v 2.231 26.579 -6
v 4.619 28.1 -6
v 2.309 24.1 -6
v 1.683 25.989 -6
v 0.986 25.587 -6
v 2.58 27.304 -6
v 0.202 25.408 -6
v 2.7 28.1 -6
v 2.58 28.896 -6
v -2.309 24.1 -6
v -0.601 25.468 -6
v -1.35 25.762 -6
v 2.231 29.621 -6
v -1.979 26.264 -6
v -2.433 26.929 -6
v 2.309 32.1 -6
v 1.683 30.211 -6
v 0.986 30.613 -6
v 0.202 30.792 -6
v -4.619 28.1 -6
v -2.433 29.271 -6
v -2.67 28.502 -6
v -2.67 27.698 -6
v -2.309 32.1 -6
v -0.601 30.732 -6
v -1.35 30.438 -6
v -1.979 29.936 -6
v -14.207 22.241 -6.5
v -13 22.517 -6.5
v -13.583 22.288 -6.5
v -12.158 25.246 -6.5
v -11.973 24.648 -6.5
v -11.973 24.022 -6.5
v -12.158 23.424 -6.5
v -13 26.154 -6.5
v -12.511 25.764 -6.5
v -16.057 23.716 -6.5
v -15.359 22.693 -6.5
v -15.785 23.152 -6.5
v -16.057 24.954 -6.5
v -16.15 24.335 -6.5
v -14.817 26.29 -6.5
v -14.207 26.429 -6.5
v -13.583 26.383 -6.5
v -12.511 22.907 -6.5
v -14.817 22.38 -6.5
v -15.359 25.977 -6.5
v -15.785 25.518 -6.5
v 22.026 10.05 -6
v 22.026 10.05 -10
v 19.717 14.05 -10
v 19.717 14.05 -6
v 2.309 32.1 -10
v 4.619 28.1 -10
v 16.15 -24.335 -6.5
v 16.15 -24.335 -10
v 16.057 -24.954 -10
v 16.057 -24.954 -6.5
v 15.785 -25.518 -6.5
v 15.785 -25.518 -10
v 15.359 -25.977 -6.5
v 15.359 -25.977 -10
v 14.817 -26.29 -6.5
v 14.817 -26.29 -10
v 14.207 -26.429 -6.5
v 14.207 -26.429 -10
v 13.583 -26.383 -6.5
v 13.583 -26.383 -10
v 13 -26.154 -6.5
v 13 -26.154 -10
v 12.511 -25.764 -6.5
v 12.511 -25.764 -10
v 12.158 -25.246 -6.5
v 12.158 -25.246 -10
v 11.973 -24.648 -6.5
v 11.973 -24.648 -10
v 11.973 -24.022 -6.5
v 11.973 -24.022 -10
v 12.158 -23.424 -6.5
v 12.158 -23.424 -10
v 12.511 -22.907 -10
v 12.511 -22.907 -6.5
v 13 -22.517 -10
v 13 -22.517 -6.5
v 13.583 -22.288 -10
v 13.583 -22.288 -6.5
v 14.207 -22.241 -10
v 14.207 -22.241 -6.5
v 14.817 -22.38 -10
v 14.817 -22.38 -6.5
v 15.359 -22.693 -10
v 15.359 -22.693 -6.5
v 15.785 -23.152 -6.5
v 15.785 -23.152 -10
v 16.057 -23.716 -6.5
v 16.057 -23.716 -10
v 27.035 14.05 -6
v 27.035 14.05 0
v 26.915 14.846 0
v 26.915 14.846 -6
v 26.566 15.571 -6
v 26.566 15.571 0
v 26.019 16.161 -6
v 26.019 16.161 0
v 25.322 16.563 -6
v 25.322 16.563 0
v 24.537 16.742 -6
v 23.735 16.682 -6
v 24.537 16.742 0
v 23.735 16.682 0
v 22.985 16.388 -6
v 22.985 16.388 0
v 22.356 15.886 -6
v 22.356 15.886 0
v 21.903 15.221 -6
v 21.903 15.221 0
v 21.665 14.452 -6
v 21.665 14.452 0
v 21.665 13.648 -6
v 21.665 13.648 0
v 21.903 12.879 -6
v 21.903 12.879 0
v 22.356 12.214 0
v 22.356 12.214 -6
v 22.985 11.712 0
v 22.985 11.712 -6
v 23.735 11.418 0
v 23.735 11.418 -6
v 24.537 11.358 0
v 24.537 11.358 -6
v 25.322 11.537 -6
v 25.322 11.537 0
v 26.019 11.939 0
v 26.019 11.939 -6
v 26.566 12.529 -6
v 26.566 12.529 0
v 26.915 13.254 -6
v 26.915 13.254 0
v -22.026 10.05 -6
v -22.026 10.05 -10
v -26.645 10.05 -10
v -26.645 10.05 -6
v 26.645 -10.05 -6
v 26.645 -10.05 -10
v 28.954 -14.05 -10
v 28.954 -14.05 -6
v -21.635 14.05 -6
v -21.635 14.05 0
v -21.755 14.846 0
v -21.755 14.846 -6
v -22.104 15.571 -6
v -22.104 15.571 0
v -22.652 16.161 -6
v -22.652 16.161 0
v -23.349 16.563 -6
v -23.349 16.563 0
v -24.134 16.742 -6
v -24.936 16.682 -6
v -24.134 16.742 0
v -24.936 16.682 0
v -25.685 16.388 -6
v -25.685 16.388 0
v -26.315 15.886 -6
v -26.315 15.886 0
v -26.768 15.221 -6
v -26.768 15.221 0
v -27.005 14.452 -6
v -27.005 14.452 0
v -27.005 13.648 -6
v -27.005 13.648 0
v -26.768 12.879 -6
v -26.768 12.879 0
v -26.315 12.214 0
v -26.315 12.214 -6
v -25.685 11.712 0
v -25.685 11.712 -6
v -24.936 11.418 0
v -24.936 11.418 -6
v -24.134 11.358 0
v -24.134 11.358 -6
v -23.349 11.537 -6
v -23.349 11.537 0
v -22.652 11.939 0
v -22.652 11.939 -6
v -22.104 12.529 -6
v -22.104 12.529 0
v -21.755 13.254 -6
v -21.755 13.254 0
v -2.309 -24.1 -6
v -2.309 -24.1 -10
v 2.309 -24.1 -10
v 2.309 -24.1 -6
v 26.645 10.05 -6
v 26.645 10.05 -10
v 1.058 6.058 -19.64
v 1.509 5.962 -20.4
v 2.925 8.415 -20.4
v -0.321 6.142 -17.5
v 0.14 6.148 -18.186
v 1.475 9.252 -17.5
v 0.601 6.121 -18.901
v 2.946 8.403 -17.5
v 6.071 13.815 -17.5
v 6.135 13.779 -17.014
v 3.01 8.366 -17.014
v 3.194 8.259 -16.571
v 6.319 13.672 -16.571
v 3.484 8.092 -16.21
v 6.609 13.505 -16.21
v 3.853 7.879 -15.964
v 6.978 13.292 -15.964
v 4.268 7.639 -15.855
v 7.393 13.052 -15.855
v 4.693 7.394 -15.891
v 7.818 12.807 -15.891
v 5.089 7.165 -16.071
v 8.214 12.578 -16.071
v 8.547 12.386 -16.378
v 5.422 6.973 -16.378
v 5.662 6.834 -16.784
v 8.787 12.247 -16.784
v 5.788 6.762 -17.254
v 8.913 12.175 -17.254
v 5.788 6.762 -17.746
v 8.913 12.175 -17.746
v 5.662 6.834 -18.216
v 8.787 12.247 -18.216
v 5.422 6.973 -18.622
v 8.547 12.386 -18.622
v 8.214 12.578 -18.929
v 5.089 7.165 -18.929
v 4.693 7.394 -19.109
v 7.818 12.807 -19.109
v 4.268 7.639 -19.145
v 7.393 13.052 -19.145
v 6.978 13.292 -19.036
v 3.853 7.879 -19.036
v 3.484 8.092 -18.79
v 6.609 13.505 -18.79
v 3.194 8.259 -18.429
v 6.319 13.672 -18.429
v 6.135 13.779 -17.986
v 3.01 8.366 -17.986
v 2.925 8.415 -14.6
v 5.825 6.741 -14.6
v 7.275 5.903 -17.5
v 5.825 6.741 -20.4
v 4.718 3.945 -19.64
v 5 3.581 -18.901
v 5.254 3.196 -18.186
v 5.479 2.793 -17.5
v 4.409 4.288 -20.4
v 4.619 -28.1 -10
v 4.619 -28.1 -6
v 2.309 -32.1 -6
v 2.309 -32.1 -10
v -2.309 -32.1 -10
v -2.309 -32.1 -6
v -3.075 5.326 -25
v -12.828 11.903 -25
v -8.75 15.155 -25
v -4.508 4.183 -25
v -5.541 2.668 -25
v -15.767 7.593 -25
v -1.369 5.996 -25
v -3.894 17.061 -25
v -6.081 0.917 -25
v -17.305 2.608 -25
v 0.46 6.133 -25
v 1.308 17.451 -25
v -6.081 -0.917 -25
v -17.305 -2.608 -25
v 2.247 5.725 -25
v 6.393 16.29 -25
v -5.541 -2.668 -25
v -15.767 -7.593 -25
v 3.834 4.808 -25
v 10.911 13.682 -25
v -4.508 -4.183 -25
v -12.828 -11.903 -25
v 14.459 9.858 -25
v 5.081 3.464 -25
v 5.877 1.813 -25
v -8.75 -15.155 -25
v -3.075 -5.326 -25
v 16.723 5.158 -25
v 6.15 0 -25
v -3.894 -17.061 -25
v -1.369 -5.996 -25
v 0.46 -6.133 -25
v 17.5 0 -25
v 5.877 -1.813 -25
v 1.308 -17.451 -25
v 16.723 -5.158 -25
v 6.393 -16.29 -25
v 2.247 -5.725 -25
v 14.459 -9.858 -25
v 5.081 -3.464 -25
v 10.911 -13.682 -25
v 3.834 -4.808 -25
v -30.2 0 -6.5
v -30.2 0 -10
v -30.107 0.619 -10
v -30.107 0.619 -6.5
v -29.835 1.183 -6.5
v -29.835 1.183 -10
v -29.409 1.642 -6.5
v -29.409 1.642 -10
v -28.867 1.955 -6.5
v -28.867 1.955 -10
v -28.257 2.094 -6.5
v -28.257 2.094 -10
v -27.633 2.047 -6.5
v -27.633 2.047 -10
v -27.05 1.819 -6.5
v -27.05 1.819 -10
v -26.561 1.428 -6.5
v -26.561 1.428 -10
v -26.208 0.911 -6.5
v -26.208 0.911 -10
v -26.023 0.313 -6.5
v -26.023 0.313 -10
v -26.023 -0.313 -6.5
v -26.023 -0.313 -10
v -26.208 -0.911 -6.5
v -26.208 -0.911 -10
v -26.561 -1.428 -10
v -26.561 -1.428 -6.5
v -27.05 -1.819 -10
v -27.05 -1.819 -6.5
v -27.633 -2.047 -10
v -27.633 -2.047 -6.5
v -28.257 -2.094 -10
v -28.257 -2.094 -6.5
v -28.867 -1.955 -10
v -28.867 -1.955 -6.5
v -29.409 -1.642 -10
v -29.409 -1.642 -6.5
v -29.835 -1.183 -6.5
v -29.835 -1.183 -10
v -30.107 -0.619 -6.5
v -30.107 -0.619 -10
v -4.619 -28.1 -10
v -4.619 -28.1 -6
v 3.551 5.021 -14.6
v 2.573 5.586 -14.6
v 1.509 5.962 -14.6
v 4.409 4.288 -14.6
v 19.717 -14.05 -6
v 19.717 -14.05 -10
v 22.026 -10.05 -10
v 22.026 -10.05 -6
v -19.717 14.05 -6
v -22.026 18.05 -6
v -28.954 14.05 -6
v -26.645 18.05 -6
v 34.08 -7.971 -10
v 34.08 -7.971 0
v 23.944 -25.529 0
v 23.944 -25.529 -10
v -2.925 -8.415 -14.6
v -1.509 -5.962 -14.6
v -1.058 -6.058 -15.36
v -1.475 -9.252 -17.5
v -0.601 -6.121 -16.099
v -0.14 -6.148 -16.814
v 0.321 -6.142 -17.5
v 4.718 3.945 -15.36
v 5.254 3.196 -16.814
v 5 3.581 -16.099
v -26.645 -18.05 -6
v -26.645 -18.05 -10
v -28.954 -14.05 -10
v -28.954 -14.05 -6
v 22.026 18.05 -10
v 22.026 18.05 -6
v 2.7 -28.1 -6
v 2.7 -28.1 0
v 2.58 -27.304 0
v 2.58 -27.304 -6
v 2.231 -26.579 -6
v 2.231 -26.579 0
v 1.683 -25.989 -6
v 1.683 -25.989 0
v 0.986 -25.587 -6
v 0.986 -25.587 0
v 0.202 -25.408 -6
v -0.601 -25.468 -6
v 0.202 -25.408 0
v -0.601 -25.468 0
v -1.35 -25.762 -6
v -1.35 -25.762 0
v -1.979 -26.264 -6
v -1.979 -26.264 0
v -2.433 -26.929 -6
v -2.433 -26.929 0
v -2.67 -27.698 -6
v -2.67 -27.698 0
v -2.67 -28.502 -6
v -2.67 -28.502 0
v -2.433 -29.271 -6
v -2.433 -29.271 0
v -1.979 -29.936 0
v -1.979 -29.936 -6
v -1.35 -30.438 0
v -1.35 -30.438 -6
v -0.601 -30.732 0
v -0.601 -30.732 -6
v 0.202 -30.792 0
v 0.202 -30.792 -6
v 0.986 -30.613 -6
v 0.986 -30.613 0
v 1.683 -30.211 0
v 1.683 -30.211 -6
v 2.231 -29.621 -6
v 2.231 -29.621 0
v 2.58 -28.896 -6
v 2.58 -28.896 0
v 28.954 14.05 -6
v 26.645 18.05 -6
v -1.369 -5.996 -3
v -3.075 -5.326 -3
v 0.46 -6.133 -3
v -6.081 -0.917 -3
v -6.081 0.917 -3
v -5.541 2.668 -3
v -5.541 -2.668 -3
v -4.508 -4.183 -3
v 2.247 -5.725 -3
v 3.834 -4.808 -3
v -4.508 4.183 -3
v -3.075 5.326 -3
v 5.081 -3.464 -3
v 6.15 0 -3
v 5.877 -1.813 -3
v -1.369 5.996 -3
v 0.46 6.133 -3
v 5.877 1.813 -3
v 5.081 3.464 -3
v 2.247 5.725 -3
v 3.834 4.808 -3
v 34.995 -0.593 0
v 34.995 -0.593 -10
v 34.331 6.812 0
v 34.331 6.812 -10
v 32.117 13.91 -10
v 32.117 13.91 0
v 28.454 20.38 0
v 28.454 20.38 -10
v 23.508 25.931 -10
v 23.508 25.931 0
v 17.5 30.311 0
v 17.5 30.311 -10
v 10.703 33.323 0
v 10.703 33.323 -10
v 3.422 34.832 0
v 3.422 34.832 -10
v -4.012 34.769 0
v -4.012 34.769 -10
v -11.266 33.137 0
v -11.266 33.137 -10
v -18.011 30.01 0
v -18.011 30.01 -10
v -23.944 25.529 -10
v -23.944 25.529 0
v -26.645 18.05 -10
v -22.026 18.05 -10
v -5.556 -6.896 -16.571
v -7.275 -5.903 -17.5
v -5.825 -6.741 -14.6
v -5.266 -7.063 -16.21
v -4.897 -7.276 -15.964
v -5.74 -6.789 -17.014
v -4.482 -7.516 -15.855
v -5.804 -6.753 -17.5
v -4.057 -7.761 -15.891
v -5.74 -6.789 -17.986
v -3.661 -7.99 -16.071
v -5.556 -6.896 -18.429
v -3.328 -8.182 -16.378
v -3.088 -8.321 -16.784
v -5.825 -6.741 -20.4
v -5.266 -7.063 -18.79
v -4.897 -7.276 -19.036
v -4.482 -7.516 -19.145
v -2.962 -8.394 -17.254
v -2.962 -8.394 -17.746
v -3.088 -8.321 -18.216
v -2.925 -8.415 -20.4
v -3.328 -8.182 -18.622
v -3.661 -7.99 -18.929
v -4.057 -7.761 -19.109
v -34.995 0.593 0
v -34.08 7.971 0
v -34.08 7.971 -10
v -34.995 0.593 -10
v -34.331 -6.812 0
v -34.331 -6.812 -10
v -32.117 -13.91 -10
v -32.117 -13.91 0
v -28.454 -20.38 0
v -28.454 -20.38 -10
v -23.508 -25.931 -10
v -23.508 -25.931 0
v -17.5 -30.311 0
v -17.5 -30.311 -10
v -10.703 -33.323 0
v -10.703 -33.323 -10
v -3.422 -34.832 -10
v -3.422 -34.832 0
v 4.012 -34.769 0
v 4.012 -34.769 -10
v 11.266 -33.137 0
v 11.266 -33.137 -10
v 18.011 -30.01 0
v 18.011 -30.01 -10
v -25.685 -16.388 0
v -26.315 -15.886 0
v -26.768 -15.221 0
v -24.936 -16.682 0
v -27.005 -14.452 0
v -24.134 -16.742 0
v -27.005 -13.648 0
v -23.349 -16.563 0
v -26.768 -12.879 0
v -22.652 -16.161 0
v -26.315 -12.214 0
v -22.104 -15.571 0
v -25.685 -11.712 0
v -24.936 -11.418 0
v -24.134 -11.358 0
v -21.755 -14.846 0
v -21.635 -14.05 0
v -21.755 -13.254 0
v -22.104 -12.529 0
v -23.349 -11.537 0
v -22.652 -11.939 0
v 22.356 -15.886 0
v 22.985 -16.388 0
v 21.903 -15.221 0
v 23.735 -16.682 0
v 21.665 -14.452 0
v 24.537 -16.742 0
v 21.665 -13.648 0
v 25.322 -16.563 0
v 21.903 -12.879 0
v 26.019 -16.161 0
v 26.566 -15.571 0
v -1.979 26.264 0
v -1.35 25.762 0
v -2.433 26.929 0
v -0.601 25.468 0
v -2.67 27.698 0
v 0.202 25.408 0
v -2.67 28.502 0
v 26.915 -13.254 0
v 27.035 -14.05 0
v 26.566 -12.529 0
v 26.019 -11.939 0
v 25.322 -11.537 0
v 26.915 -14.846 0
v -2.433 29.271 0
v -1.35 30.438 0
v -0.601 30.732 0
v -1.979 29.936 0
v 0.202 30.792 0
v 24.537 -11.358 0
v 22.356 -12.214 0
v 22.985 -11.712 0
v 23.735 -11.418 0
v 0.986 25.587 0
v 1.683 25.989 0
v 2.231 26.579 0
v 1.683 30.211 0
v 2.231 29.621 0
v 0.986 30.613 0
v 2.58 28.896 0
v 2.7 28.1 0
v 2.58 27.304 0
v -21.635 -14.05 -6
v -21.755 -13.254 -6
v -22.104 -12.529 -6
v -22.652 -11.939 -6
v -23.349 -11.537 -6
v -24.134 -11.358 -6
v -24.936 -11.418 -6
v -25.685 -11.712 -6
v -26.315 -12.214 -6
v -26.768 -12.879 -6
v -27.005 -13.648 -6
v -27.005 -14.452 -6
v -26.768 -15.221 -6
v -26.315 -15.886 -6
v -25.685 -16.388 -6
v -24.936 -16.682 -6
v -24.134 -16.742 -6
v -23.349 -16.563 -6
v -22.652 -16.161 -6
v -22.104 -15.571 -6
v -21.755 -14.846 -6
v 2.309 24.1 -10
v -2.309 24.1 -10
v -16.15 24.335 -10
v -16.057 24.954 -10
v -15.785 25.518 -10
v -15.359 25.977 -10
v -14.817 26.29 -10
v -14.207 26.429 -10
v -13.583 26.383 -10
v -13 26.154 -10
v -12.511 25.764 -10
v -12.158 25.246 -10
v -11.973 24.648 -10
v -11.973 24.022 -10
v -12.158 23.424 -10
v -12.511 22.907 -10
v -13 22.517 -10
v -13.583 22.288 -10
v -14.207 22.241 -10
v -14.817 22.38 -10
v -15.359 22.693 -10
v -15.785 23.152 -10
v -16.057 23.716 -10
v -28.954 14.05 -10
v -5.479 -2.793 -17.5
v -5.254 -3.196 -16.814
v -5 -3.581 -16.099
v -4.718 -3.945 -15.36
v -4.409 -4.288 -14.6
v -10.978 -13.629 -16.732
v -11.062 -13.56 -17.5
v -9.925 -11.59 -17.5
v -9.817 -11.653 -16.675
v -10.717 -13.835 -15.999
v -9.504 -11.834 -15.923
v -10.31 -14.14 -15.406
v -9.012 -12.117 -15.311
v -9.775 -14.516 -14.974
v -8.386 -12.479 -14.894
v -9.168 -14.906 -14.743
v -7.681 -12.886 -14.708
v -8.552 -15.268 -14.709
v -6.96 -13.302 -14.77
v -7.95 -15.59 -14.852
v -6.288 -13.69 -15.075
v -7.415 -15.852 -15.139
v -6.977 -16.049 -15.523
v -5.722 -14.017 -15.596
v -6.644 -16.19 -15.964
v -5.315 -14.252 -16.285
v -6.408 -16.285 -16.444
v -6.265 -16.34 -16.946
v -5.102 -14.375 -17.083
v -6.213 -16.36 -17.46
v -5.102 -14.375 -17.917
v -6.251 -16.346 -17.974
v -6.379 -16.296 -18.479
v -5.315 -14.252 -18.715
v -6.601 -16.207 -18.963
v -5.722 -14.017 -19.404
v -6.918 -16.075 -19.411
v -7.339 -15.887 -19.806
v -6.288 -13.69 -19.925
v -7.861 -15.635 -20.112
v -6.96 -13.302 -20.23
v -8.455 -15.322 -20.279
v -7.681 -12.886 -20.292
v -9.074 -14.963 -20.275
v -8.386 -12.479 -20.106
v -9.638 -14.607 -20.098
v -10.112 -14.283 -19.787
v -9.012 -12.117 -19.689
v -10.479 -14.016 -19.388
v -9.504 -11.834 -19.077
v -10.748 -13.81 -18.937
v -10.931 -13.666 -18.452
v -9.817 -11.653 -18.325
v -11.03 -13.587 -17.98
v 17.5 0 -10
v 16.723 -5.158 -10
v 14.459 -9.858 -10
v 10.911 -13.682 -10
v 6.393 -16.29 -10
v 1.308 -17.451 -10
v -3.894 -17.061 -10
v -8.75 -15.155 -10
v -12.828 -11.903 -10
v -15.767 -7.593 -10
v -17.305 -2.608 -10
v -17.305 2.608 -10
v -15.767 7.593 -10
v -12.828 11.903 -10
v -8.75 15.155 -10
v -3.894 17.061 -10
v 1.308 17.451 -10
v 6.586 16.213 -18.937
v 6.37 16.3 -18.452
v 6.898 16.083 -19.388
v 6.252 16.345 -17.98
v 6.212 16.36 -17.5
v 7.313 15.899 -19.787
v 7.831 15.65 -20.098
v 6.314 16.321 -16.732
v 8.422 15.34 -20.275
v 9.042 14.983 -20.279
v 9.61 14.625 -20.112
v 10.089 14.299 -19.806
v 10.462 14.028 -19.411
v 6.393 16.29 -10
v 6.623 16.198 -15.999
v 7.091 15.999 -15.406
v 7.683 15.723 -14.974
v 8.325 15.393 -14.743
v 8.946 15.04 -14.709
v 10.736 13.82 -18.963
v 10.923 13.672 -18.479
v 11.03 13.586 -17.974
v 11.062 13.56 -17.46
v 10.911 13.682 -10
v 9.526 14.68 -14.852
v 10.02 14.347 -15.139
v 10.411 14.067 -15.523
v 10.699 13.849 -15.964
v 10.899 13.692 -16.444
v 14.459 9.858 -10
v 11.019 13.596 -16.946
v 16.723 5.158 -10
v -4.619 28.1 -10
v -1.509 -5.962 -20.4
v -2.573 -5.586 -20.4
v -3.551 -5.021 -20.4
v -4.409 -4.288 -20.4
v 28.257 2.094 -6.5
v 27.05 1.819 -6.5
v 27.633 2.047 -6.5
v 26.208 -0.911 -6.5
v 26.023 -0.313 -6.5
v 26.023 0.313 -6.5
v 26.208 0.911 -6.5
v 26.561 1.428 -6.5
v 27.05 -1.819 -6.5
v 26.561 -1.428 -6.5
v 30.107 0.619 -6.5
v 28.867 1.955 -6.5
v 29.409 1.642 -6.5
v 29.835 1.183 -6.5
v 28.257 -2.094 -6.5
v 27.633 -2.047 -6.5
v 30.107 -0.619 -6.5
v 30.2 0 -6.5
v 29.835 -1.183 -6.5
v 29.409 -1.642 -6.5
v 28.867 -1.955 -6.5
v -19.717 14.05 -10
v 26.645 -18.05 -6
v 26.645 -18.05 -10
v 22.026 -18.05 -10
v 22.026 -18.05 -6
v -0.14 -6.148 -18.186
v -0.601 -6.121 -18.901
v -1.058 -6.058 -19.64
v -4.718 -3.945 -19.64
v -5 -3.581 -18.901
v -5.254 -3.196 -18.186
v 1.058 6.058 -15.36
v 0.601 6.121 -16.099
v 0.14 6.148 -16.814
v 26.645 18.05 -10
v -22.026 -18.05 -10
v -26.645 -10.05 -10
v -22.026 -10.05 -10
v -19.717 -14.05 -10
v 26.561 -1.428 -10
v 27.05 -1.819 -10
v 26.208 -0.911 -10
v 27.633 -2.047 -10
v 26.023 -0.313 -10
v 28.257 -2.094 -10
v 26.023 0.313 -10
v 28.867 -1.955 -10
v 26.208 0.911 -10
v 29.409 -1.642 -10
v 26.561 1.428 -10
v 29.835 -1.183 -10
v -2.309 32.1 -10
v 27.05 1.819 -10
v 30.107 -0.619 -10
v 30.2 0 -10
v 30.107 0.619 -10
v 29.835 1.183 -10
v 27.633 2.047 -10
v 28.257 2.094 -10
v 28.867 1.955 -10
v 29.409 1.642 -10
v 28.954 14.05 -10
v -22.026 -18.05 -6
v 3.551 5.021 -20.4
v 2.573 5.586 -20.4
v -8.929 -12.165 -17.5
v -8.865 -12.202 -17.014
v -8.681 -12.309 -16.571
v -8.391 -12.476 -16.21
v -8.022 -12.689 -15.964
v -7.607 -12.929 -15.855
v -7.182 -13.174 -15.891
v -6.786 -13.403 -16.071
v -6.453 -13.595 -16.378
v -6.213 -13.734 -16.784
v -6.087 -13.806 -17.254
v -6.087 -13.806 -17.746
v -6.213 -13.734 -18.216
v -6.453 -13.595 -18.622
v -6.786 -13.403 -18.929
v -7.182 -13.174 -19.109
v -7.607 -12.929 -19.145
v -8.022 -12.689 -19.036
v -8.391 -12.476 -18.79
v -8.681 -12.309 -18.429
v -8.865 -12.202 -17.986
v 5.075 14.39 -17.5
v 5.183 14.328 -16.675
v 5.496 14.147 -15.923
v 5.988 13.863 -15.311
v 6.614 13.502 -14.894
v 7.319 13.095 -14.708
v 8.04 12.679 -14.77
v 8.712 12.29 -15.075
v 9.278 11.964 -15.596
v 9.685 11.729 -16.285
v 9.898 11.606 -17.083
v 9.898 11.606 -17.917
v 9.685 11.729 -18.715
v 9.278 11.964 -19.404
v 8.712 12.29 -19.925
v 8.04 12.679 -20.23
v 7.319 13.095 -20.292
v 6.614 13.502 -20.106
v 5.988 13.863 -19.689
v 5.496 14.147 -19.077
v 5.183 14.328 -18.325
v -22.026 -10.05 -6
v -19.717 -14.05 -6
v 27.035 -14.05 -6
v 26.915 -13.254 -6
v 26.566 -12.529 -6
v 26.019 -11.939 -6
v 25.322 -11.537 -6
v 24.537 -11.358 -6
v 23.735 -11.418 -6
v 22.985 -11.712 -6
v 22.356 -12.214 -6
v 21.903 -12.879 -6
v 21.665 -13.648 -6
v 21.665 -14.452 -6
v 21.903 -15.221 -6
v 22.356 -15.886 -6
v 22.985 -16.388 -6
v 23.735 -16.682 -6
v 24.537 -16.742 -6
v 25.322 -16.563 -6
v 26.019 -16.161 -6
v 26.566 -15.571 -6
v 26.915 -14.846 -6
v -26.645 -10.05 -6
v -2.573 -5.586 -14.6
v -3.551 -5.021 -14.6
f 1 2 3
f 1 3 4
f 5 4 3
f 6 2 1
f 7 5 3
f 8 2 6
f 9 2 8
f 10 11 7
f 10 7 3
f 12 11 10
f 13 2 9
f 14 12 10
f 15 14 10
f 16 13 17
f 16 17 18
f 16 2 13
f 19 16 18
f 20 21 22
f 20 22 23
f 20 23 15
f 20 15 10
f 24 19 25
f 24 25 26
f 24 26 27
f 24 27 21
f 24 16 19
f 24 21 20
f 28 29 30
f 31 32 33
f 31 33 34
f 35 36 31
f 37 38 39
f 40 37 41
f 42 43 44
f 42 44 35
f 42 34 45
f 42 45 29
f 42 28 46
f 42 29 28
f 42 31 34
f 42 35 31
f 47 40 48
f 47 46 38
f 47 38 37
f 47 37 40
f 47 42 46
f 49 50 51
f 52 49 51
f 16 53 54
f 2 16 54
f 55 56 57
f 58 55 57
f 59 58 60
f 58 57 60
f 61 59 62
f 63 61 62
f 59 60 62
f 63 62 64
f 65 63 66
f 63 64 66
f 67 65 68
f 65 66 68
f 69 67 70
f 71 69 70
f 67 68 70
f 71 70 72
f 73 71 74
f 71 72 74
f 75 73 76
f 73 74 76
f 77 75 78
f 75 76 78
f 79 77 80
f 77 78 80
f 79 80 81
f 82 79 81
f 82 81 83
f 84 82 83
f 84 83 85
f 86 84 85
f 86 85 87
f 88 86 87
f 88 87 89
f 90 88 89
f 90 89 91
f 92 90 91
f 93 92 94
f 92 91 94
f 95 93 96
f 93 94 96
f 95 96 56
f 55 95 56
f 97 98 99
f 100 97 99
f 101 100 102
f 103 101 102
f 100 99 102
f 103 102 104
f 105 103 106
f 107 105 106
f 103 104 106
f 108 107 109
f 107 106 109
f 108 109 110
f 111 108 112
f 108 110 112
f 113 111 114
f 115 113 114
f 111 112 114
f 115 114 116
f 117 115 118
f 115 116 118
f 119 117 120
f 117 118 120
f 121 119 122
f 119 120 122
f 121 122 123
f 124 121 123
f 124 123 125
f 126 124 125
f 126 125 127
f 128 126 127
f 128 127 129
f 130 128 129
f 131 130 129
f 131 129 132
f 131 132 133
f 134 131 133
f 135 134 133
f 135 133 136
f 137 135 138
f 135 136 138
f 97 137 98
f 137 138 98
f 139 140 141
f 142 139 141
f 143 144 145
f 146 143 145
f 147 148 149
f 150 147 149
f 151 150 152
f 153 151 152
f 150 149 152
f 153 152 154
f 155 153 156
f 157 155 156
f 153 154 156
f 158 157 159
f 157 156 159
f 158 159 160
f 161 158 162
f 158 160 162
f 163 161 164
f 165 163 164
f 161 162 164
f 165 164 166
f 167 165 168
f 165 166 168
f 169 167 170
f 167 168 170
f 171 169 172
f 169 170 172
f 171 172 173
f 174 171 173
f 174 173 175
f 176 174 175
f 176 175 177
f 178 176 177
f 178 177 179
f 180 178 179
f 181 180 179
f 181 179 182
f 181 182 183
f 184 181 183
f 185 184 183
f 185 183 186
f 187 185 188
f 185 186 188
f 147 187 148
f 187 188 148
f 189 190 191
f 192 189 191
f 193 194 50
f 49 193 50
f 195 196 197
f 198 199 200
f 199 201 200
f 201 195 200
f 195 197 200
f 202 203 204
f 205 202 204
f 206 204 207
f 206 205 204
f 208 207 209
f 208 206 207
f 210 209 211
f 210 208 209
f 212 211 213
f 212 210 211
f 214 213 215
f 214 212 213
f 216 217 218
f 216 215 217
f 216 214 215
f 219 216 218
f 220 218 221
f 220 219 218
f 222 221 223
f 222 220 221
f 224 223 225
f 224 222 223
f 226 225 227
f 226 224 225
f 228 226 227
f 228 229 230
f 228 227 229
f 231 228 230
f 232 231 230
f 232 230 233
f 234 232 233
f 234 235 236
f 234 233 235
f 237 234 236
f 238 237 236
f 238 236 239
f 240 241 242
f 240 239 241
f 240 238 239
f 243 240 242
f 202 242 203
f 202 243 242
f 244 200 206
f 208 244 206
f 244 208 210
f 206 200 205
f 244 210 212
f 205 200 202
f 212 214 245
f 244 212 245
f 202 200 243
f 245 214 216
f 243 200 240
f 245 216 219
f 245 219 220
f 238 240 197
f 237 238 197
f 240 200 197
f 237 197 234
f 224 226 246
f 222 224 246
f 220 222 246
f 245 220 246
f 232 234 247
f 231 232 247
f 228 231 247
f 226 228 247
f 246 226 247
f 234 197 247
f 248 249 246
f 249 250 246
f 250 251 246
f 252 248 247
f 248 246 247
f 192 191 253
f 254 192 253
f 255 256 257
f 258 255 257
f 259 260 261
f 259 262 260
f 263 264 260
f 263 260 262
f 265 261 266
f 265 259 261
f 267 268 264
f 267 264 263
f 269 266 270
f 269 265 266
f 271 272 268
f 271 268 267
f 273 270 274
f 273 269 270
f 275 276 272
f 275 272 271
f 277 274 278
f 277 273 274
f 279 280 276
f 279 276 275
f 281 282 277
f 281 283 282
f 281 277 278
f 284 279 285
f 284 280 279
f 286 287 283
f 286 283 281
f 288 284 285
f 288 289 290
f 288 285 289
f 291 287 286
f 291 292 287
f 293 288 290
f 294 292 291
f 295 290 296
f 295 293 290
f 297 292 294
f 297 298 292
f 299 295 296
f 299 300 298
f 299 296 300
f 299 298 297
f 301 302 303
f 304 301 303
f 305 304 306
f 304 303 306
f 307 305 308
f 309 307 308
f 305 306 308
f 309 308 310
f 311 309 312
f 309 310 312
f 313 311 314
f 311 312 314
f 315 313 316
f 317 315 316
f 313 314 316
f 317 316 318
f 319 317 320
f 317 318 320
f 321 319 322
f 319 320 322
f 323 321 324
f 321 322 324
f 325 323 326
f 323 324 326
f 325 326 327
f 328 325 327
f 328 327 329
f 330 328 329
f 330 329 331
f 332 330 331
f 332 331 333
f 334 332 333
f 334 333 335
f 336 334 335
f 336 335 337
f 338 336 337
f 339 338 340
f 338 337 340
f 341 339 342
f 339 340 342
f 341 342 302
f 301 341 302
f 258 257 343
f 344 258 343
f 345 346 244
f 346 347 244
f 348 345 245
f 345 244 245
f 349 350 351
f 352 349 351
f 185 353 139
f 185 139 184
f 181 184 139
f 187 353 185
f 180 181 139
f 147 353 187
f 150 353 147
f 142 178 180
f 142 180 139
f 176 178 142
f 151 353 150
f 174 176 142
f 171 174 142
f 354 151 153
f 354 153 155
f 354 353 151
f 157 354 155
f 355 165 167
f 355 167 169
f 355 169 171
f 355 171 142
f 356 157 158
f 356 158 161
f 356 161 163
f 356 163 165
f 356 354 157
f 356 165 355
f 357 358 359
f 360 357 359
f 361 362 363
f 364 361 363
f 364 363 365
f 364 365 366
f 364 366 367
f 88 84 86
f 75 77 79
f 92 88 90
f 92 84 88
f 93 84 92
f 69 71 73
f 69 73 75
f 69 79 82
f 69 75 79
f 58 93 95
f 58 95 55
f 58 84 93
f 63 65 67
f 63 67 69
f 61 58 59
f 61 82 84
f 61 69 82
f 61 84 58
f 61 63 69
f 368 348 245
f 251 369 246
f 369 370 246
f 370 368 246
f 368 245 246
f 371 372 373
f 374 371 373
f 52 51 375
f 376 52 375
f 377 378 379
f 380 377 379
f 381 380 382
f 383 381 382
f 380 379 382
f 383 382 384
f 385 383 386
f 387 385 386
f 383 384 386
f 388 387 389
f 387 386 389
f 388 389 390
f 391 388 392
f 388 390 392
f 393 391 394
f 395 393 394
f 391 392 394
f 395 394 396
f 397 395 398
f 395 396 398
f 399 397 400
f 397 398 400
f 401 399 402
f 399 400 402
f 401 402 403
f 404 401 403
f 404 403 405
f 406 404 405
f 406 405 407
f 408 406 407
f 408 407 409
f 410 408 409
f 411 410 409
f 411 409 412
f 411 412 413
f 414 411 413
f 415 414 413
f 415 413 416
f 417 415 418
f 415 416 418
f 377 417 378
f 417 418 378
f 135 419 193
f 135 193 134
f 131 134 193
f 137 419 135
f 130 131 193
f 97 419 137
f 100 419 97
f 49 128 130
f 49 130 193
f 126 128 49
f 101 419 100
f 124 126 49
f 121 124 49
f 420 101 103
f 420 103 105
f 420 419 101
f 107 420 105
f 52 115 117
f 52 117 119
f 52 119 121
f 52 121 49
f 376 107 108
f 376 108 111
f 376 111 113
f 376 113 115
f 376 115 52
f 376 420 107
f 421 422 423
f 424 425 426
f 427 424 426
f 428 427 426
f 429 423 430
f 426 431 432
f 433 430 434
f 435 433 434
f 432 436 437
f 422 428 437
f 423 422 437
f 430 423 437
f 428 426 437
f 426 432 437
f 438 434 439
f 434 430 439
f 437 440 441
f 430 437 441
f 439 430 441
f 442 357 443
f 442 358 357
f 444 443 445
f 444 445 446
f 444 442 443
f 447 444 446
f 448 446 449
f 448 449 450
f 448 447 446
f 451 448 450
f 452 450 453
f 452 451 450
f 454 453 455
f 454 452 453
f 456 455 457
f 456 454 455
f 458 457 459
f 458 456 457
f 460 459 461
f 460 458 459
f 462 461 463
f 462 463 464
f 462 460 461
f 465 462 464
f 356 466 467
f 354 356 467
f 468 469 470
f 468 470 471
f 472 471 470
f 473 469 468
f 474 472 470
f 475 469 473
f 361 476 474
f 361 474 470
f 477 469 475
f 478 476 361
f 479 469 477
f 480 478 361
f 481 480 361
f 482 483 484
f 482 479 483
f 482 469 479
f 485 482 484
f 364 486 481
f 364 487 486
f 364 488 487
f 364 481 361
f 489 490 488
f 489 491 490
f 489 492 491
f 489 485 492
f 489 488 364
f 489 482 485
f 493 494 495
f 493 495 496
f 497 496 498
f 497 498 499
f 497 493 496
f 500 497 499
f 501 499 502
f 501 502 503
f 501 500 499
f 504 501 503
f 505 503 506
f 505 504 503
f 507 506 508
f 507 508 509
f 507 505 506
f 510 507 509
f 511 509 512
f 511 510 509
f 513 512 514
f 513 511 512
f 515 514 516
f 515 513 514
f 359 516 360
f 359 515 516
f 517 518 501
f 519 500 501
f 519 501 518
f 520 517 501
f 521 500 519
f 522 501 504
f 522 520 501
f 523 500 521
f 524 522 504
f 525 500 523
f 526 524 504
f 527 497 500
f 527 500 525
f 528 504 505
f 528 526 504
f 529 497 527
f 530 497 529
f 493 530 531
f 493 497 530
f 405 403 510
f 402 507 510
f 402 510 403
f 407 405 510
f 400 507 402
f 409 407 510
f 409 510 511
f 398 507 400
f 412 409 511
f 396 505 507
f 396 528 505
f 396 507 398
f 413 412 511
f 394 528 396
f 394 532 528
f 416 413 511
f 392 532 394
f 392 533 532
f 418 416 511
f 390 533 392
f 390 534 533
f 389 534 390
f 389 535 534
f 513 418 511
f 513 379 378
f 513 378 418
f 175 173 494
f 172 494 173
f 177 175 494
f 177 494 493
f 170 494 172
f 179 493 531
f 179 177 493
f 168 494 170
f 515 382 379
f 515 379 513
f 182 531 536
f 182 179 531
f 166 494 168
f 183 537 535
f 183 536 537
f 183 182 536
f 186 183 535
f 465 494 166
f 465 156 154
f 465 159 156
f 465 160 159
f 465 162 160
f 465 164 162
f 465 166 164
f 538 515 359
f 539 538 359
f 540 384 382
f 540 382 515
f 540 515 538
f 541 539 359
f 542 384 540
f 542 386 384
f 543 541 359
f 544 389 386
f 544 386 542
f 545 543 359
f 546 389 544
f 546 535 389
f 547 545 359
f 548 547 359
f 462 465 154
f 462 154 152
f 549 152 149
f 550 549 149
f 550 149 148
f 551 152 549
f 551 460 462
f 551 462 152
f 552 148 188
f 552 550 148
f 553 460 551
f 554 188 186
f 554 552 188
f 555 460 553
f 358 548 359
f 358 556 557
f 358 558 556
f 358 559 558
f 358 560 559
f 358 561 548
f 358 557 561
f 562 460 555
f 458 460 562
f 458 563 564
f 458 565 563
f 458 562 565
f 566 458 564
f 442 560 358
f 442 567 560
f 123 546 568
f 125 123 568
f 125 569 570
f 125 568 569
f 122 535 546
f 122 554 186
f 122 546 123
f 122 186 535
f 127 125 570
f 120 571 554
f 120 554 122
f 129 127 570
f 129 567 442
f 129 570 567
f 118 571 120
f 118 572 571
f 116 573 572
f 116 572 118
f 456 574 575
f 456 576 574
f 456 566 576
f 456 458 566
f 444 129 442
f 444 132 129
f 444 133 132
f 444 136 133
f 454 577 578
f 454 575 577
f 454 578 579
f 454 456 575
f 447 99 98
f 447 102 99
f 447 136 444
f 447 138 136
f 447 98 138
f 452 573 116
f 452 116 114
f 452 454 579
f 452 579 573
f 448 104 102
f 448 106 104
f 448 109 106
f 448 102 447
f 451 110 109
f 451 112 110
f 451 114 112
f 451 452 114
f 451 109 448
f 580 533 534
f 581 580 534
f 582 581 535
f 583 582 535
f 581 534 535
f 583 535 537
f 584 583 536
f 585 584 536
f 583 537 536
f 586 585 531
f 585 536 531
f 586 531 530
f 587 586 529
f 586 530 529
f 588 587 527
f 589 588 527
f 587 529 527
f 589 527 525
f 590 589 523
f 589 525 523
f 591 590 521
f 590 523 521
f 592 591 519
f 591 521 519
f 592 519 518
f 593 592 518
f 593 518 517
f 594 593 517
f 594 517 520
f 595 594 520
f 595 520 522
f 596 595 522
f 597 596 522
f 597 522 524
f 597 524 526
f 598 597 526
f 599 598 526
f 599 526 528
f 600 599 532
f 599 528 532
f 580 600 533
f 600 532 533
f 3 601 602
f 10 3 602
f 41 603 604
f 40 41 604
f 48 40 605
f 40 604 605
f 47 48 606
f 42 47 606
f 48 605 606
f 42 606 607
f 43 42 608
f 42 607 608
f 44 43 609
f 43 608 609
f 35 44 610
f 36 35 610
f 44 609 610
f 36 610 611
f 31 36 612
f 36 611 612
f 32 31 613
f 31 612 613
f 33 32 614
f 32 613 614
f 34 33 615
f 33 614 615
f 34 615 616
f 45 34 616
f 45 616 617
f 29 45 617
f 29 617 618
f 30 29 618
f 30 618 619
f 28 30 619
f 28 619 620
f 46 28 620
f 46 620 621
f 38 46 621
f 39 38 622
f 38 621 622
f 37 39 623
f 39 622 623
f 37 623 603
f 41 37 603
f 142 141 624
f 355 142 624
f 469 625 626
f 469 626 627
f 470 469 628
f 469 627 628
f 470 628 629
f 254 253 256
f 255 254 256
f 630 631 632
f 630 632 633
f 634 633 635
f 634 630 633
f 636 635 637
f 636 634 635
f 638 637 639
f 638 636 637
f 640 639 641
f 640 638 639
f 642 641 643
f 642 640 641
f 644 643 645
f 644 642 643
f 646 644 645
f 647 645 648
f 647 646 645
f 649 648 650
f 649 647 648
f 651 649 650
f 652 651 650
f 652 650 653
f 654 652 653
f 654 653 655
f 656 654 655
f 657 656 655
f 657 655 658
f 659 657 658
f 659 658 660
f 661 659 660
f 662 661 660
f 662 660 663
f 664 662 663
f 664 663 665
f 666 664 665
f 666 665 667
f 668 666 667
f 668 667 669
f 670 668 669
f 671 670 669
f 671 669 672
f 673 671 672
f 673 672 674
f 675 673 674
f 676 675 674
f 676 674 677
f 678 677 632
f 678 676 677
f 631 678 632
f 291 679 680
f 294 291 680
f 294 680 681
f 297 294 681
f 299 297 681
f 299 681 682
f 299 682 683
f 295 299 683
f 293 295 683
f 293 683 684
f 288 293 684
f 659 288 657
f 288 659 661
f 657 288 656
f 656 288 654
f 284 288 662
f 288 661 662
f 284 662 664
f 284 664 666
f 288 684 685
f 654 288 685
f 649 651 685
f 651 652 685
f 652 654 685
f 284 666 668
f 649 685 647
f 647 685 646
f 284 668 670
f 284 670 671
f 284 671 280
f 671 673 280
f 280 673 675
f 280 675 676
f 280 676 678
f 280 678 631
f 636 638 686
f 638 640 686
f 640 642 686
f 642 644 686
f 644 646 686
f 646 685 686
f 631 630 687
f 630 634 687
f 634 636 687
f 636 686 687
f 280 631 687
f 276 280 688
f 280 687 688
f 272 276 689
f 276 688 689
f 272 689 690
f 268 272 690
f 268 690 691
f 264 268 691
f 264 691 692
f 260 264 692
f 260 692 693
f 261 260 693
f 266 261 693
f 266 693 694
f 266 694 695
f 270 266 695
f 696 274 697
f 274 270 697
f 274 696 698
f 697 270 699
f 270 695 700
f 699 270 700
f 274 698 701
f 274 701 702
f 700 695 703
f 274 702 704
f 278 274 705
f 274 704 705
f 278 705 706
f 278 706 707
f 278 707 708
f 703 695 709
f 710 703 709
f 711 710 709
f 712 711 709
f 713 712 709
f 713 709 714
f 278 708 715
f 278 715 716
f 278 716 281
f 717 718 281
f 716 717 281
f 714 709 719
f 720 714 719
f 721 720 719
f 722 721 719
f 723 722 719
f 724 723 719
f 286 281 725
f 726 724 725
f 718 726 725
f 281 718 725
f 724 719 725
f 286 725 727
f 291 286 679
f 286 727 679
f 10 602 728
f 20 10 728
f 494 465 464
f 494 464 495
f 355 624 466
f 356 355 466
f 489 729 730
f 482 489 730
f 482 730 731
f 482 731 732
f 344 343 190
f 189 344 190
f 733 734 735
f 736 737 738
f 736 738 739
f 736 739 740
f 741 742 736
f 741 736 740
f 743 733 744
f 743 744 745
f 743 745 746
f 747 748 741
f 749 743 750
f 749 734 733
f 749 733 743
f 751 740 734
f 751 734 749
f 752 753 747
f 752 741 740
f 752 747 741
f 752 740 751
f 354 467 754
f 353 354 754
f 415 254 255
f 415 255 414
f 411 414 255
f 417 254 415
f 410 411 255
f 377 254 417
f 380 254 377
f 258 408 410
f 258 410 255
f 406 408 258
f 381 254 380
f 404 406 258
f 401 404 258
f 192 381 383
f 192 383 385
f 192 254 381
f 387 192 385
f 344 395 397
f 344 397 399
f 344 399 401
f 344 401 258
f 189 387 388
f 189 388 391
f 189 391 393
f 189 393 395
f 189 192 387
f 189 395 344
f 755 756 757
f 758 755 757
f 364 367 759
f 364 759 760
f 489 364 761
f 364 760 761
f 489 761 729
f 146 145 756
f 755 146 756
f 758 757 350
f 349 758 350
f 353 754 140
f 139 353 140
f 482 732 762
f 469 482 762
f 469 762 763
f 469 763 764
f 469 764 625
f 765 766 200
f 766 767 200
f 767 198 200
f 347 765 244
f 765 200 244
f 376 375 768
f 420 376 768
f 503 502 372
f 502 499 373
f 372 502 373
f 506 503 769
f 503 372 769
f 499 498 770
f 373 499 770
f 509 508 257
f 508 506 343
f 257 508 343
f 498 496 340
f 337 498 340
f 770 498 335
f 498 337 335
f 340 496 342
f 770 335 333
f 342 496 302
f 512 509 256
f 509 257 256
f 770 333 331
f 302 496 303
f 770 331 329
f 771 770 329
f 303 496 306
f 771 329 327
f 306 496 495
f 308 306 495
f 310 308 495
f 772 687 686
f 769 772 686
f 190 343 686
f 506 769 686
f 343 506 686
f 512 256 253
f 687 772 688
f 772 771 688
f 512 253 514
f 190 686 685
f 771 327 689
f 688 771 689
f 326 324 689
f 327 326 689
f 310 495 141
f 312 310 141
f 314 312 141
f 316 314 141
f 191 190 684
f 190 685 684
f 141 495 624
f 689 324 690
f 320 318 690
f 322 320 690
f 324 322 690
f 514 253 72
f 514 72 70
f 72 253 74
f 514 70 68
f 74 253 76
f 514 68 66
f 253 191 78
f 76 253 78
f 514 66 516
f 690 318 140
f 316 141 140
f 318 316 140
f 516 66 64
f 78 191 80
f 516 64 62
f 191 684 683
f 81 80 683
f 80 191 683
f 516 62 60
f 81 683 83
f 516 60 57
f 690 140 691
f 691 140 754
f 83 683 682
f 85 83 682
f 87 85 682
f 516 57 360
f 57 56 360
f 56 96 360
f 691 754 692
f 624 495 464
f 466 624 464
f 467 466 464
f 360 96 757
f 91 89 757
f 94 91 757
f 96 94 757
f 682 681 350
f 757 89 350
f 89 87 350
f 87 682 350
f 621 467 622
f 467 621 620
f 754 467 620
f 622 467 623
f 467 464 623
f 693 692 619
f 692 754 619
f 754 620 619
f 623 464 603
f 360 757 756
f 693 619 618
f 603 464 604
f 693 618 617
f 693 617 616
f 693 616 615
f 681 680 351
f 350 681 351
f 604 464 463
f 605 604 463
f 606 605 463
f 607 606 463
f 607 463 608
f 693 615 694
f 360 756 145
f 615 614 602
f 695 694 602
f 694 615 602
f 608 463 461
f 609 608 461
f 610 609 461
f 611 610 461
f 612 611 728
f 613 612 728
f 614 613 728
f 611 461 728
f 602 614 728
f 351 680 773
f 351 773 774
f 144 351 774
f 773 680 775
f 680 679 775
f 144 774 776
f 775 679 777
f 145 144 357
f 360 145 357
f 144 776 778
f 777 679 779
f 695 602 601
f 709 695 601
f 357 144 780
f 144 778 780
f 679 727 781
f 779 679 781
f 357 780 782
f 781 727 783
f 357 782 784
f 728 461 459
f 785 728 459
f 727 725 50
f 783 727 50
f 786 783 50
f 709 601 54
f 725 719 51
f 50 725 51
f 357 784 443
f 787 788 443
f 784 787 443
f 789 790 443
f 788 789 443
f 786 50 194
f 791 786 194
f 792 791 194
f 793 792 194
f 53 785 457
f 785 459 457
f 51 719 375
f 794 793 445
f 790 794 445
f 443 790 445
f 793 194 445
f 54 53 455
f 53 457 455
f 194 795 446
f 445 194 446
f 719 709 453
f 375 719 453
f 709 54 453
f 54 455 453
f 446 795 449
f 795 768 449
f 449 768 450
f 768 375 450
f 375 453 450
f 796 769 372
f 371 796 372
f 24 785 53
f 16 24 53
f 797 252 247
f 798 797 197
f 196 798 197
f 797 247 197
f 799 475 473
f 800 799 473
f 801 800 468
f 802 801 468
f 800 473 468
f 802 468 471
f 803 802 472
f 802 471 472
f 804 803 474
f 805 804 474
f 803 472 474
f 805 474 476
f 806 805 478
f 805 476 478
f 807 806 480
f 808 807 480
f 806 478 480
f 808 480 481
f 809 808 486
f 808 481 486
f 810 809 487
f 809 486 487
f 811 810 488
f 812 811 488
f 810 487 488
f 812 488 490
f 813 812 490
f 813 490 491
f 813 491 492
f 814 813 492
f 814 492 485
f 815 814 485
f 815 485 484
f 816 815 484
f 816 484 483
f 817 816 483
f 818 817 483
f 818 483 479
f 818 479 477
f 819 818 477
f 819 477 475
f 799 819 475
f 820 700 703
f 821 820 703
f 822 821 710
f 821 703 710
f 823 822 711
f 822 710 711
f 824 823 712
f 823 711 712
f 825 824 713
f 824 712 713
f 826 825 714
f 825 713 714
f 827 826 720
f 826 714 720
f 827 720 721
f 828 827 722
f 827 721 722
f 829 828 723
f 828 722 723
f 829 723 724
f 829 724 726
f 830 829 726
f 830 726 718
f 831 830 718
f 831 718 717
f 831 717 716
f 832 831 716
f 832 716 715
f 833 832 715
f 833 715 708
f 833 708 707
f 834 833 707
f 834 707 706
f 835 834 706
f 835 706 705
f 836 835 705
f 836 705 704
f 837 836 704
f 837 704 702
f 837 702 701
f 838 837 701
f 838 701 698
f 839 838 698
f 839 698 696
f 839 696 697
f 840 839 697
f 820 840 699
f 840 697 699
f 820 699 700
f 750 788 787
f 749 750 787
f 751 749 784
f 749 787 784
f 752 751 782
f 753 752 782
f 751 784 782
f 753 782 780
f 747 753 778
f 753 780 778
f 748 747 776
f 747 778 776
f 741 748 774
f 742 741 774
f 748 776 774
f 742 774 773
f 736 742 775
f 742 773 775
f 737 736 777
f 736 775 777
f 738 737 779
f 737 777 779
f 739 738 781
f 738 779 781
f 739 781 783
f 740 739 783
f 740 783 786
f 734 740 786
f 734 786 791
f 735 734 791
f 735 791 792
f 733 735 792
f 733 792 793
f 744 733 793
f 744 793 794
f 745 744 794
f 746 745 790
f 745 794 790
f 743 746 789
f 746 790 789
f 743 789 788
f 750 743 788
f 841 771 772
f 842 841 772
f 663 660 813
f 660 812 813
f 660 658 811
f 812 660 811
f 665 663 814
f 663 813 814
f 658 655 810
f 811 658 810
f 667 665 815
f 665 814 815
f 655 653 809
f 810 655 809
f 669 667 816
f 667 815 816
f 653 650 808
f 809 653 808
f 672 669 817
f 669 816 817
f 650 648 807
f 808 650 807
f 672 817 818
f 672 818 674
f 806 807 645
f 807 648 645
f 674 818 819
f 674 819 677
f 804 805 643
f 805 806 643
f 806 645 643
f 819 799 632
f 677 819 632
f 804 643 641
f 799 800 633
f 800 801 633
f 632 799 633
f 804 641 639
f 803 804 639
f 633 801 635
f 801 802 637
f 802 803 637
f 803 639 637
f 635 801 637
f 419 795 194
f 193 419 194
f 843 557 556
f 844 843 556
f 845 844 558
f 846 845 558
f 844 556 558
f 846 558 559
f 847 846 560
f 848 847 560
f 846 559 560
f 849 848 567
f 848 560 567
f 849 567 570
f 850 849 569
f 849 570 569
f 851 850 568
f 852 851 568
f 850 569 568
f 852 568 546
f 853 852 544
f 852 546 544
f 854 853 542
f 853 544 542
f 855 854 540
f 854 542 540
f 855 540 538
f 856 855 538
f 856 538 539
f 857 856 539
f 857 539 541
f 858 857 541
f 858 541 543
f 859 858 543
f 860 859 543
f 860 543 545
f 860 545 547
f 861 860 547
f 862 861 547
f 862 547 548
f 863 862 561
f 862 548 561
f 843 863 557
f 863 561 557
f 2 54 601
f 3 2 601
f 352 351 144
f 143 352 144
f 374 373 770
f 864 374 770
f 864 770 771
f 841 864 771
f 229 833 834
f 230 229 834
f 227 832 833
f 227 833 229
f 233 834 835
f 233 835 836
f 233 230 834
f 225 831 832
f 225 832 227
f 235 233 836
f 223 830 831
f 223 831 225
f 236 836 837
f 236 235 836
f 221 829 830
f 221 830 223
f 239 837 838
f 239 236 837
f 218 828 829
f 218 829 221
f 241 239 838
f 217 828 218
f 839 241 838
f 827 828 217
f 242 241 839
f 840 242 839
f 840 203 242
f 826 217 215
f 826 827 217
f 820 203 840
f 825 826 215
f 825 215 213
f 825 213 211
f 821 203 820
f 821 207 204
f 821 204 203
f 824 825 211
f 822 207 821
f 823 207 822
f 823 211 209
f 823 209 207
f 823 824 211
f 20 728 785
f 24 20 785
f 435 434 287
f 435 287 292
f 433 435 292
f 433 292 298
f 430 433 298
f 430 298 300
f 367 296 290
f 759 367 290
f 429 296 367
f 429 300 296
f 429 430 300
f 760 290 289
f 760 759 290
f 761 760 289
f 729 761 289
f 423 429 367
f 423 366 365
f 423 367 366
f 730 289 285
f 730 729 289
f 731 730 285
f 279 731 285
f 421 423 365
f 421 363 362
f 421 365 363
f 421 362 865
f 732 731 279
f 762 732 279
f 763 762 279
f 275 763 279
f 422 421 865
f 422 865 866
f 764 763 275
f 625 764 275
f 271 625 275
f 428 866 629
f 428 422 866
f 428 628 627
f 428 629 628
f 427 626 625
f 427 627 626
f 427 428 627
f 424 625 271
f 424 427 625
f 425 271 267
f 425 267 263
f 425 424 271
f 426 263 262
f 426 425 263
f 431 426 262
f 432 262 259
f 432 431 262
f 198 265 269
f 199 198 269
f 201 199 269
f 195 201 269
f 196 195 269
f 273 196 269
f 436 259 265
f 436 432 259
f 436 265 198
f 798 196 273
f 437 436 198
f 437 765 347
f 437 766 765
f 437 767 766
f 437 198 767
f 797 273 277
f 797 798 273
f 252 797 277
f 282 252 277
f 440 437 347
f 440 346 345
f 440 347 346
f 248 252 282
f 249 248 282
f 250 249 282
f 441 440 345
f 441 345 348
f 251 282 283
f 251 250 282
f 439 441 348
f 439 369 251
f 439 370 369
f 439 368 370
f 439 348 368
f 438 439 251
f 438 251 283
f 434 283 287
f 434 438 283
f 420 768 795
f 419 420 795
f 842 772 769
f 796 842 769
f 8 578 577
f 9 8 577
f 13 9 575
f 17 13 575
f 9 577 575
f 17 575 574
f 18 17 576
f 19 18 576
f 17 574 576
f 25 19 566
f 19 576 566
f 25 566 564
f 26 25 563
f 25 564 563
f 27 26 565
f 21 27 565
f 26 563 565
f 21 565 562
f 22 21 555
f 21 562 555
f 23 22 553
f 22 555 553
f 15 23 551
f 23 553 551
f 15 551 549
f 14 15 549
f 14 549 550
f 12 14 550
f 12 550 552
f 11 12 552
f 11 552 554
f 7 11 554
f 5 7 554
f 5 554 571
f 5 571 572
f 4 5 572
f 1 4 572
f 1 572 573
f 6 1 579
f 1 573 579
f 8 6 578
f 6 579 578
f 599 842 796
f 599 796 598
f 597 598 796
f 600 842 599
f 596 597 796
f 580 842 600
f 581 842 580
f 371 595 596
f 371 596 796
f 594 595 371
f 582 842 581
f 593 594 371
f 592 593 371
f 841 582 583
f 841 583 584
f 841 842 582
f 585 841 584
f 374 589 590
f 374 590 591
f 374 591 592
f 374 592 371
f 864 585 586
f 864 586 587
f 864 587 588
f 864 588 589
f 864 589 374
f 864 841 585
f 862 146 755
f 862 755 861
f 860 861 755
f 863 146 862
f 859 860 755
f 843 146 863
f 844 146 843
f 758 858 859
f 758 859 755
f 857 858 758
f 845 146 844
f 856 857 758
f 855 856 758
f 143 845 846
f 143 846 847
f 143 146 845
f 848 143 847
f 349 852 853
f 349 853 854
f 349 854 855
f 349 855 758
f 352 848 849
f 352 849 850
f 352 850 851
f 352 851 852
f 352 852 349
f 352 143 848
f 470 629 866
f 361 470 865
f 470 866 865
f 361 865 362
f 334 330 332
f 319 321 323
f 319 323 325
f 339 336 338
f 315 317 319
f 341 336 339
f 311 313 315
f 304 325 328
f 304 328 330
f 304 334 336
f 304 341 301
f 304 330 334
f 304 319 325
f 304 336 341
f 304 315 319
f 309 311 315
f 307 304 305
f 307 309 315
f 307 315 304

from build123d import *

# Parameters (mm, degrees)
SKETCH3_R               = 35
SKETCH3_R_2             = 6.15
BOSS_EXTRUDE1_DEPTH     = 10
SKETCH4_R               = 17.5
SKETCH4_R_2             = 6.15
BOSS_EXTRUDE2_DEPTH     = 15
SKETCH5_R               = 6.15
BOSS_EXTRUDE3_DEPTH     = 3
SKETCH7_R               = 2.7
CUT_EXTRUDE1_DEPTH      = 6
CUT_EXTRUDE2_DEPTH      = 10
SKETCH9_R               = 1.65
CUT_EXTRUDE3_DEPTH      = 84.669466186
CUT_EXTRUDE3_DEPTH_BACK = 84.669466186
CUT_EXTRUDE4_DEPTH      = 8.75
CUT_EXTRUDE5_START      = 20
SKETCH11_R              = 2.8
CUT_EXTRUDE5_DEPTH      = 5
SKETCH17_R              = 2.1
CUT_EXTRUDE6_DEPTH      = 3.5
CUT_EXTRUDE7_DEPTH      = 4


with BuildPart() as part:
    # Sketch3 → Boss-Extrude1 (new body)
    with BuildSketch(Plane.XY):
        Circle(SKETCH3_R)
        Circle(SKETCH3_R_2, mode=Mode.SUBTRACT)
    extrude(amount=-BOSS_EXTRUDE1_DEPTH)

    # Sketch4 → Boss-Extrude2 (add)
    with BuildSketch(Plane(origin=(0, 0, -10), x_dir=(-1, 0, 0), z_dir=(0, 0, -1))):
        with Locations(Location((0, 0, 0), (0, 0, 180))):
            Circle(SKETCH4_R)
        with Locations(Location((0, 0, 0), (0, 0, 180))):
            Circle(SKETCH4_R_2, mode=Mode.SUBTRACT)
    extrude(amount=BOSS_EXTRUDE2_DEPTH)

    # Sketch5 → Boss-Extrude3 (add)
    with BuildSketch(Plane.XY):
        Circle(SKETCH5_R)
    extrude(amount=-BOSS_EXTRUDE3_DEPTH)

    # Sketch7 → Cut-Extrude1 (cut)
    with BuildSketch(Plane.XY):
        with Locations((-24.335313846, 14.05)):
            Circle(SKETCH7_R)
        with Locations((-24.335313846, -14.05)):
            Circle(SKETCH7_R)
        with Locations((0, -28.1)):
            Circle(SKETCH7_R)
        with Locations((24.335313846, -14.05)):
            Circle(SKETCH7_R)
        with Locations((24.335313846, 14.05)):
            Circle(SKETCH7_R)
        with Locations((0, 28.1)):
            Circle(SKETCH7_R)
    extrude(amount=-CUT_EXTRUDE1_DEPTH, mode=Mode.SUBTRACT)

    # Sketch8 → Cut-Extrude2 (cut)
    with BuildSketch(Plane.XY):
        with BuildLine():
            Line((-23.943567294, 25.528524933), (-34.08013476, 7.971475067))
            ThreePointArc((-34.08013476, 7.971475067), (-30.310889132, 17.5), (-23.943567294, 25.528524933))
        make_face()
        with BuildLine():
            Line((34.08013476, -7.971475067), (23.943567294, -25.528524933))
            ThreePointArc((23.943567294, -25.528524933), (30.310889132, -17.5), (34.08013476, -7.971475067))
        make_face()
    extrude(amount=-CUT_EXTRUDE2_DEPTH, mode=Mode.SUBTRACT)

    # Sketch9 → Cut-Extrude3 (cut, two sides)
    with BuildSketch(Plane(origin=(-29.011851027, 16.75, -10), x_dir=(0.8660254037844387, -0.4999999999999999, 0), z_dir=(0.49999999999999994, 0.8660254037844388, 0))) as cut_extrude3_sk:
        with Locations(Location((33.5, 7.5, 0), (0, 0, 180))):
            Circle(SKETCH9_R)
    extrude(amount=CUT_EXTRUDE3_DEPTH, mode=Mode.SUBTRACT)
    extrude(cut_extrude3_sk.sketch, amount=-CUT_EXTRUDE3_DEPTH_BACK, mode=Mode.SUBTRACT)

    # Sketch10 → Cut-Extrude4 (cut, symmetric)
    with BuildSketch(Plane(origin=(-29.011851027, 16.75, -10), x_dir=(0.8660254037844387, -0.4999999999999999, 0), z_dir=(0.49999999999999994, 0.8660254037844388, 0))):
        Polygon((35.174315781, 10.4), (31.825684219, 10.4), (30.151368439, 7.5), (31.825684219, 4.6), (35.174315781, 4.6), (36.848631561, 7.5), align=None)
    extrude(amount=CUT_EXTRUDE4_DEPTH, both=True, mode=Mode.SUBTRACT)

    # Sketch11 → Cut-Extrude5 (cut)
    with BuildSketch(Plane(origin=(-29.011851027, 16.75, -10), x_dir=(0.8660254037844387, -0.4999999999999999, 0), z_dir=(0.49999999999999994, 0.8660254037844388, 0)).offset(CUT_EXTRUDE5_START)):
        with Locations(Location((33.5, 7.5, 0), (0, 0, 180))):
            Circle(SKETCH11_R)
    cut_extrude5 = extrude(amount=-CUT_EXTRUDE5_DEPTH, mode=Mode.SUBTRACT)

    # Mirror1: Cut-Extrude5 across plane
    add(cut_extrude5.mirror(Plane(origin=(-29.011851027, 16.75, -10), x_dir=(0, 0, 1), z_dir=(0.49999999999999994, 0.8660254037844388, 0))), mode=Mode.SUBTRACT)

    # Sketch17 → Cut-Extrude6 (cut)
    with BuildSketch(Plane(origin=(0, 0, -10), x_dir=(-1, 0, 0), z_dir=(0, 0, -1))):
        with Locations((14.05, 24.335313846)):
            Circle(SKETCH17_R)
        with Locations((28.1, 0)):
            Circle(SKETCH17_R)
        with Locations(Location((-28.1, 0, 0), (0, 0, 180))):
            Circle(SKETCH17_R)
        with Locations(Location((-14.05, -24.335313846, 0), (0, 0, 180))):
            Circle(SKETCH17_R)
    extrude(amount=-CUT_EXTRUDE6_DEPTH, mode=Mode.SUBTRACT)

    # Sketch18 → Cut-Extrude7 (cut)
    with BuildSketch(Plane(origin=(0, 0, -10), x_dir=(-1, 0, 0), z_dir=(0, 0, -1))):
        Polygon((26.644714923, 18.05), (22.02591277, 18.05), (19.716511693, 14.05), (22.02591277, 10.05), (26.644714923, 10.05), (28.954116, 14.05), align=None)
        Polygon((-2.309401077, 32.1), (-4.618802154, 28.1), (-2.309401077, 24.1), (2.309401077, 24.1), (4.618802154, 28.1), (2.309401077, 32.1), align=None)
        Polygon((28.954116, -14.05), (26.644714923, -10.05), (22.02591277, -10.05), (19.716511693, -14.05), (22.02591277, -18.05), (26.644714923, -18.05), align=None)
        Polygon((2.309401077, -32.1), (4.618802154, -28.1), (2.309401077, -24.1), (-2.309401077, -24.1), (-4.618802154, -28.1), (-2.309401077, -32.1), align=None)
        Polygon((-26.644714923, -18.05), (-22.02591277, -18.05), (-19.716511693, -14.05), (-22.02591277, -10.05), (-26.644714923, -10.05), (-28.954116, -14.05), align=None)
        Polygon((-28.954116, 14.05), (-26.644714923, 10.05), (-22.02591277, 10.05), (-19.716511693, 14.05), (-22.02591277, 18.05), (-26.644714923, 18.05), align=None)
    extrude(amount=-CUT_EXTRUDE7_DEPTH, mode=Mode.SUBTRACT)


solid = part.part
